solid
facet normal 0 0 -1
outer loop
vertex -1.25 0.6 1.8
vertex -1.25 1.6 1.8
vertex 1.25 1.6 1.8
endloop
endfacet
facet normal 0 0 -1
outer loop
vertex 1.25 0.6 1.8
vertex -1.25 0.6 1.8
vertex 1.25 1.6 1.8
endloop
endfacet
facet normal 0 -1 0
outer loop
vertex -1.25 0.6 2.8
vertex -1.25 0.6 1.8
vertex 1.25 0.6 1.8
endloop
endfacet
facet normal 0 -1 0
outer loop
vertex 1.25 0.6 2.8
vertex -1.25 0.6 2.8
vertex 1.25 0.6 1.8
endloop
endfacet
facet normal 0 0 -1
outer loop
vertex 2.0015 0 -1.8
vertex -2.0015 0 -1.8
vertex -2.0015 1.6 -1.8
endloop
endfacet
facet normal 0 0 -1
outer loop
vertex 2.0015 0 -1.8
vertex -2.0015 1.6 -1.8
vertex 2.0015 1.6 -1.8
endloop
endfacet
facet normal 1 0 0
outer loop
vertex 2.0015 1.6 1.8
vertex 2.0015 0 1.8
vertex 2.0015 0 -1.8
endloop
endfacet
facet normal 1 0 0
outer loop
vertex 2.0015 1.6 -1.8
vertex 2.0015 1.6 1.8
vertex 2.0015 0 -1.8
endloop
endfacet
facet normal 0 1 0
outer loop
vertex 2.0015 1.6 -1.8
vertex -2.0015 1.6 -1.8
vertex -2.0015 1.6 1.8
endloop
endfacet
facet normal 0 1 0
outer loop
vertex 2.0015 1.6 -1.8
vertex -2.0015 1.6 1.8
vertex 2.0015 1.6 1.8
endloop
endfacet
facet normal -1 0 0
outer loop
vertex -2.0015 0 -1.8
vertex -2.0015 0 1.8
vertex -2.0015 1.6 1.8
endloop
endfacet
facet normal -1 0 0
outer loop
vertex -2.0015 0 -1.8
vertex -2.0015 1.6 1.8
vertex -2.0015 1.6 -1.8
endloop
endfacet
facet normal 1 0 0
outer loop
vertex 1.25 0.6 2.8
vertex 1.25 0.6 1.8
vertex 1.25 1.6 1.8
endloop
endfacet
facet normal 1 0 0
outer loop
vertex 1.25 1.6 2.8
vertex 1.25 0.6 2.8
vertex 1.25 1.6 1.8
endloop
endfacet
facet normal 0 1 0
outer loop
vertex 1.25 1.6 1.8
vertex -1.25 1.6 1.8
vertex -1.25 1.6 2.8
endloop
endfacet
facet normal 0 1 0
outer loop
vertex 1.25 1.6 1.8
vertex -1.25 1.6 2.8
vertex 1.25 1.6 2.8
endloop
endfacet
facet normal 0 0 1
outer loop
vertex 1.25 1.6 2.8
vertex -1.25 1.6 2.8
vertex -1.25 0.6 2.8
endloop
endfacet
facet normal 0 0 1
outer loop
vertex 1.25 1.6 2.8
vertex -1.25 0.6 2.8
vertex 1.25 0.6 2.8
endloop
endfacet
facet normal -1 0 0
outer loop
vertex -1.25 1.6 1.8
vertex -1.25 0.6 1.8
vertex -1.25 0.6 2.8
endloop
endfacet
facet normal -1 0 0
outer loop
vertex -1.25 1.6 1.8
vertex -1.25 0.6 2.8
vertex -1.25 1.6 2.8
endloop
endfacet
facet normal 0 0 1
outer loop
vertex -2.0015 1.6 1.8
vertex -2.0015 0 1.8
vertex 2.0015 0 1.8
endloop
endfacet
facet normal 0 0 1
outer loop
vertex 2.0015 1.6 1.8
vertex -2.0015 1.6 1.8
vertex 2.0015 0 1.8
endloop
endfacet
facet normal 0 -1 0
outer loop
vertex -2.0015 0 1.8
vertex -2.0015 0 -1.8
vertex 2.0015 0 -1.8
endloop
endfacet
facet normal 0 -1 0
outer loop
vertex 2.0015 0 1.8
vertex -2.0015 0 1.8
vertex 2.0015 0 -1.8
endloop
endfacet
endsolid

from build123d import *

# Parameters (mm, degrees)
SKETCH1_W           = 4.00295564
SKETCH1_H           = 3.6
BOSS_EXTRUDE1_DEPTH = 1.6
SKETCH2_W           = 2.5
SKETCH2_H           = 1
BOSS_EXTRUDE2_DEPTH = 1


with BuildPart() as part:
    # Sketch1 → Boss-Extrude1 (new body)
    with BuildSketch(Plane(origin=(0, 0, 0), x_dir=(1, 0, 0), z_dir=(0, 1, 0))):
        Rectangle(SKETCH1_W, SKETCH1_H)
    extrude(amount=BOSS_EXTRUDE1_DEPTH)


with BuildPart() as body_2:
    # Sketch2 → Boss-Extrude2 (new body)
    with BuildSketch(Plane.XY.offset(1.8)):
        with Locations((0, 1.1)):
            Rectangle(SKETCH2_W, SKETCH2_H)
    extrude(amount=BOSS_EXTRUDE2_DEPTH)


solid = Compound([part.part, body_2.part])
